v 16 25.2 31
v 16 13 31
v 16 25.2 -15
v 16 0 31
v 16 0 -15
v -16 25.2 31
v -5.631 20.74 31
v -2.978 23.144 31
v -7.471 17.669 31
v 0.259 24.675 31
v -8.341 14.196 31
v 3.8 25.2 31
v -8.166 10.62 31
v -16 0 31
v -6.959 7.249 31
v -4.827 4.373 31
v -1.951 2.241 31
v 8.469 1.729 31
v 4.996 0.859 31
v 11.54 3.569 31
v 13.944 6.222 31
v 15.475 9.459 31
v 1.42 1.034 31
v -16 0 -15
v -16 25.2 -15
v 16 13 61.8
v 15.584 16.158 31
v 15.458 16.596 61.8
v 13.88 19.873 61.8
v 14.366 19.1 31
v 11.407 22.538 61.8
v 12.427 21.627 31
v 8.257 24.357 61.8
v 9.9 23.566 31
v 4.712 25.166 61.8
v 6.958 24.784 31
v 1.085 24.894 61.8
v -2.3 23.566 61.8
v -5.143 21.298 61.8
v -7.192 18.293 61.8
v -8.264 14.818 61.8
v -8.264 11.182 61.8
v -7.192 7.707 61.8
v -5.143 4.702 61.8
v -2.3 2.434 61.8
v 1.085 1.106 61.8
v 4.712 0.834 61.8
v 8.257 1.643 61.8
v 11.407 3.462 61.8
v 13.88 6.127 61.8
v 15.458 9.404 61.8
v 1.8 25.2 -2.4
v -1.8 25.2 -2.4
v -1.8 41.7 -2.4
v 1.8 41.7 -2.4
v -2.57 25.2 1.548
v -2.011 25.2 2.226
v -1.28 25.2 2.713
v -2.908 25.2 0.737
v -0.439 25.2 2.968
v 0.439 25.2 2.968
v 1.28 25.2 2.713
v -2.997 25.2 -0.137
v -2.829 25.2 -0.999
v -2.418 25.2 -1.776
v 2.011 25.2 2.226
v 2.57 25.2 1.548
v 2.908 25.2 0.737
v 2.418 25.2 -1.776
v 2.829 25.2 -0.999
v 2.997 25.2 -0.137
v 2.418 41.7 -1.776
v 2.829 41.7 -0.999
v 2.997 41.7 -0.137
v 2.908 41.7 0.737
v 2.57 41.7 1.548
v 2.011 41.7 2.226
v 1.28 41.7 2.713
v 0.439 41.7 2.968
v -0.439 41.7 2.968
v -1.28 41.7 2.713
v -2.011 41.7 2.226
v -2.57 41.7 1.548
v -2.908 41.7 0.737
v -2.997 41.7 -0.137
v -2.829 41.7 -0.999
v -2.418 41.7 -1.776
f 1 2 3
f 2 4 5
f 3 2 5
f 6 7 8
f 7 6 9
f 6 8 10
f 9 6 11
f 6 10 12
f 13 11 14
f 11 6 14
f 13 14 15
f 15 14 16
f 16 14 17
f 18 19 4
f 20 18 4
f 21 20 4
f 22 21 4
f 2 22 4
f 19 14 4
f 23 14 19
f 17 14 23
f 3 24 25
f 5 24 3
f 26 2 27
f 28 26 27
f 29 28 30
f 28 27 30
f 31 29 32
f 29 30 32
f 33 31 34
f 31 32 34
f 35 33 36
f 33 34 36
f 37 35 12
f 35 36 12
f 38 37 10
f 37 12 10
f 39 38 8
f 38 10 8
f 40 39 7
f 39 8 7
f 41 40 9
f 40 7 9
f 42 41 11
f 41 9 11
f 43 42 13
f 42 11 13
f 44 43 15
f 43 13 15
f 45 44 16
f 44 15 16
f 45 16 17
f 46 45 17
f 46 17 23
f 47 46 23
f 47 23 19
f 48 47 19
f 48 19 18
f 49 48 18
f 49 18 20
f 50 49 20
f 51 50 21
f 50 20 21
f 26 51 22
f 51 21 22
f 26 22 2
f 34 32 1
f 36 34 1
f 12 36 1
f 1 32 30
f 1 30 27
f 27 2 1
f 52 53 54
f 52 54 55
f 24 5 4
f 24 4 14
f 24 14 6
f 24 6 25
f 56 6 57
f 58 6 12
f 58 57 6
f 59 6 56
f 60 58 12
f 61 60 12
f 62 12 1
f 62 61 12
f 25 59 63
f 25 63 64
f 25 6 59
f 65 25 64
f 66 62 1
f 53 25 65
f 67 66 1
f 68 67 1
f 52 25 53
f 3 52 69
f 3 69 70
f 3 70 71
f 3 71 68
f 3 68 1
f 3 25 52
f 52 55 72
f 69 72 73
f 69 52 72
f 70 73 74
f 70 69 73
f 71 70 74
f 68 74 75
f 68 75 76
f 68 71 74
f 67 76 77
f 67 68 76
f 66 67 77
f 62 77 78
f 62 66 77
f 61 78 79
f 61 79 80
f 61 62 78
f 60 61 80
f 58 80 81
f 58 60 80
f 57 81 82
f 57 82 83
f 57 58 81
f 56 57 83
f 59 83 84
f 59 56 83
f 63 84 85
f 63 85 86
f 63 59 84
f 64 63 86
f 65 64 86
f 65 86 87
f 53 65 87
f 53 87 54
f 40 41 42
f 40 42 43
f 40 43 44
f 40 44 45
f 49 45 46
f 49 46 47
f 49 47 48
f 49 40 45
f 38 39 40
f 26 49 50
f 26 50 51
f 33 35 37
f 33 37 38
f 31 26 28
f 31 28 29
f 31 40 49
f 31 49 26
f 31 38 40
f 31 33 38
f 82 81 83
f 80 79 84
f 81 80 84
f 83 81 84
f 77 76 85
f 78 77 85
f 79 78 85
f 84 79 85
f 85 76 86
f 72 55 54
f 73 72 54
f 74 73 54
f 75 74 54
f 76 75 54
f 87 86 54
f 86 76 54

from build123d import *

# Parameters (mm, degrees)
SKETCH1_W           = 32
SKETCH1_H           = 46
BOSS_EXTRUDE1_DEPTH = 25.2
BOSS_EXTRUDE2_START = 25.2
BOSS_EXTRUDE2_DEPTH = 16.5
SKETCH2_R           = 12.2
BOSS_EXTRUDE3_DEPTH = 30.8


with BuildPart() as part:
    # Sketch1 → Boss-Extrude1 (new body)
    # profile 1 of 2: a face of its own
    with BuildSketch(Plane(origin=(0, 0, 0), x_dir=(1, 0, 0), z_dir=(0, 1, 0))):
        with Locations((0, -8)):
            Rectangle(SKETCH1_W, SKETCH1_H)
        with BuildLine():
            ThreePointArc((-1.8, 2.4), (0, -3), (1.8, 2.4))
            Line((1.8, 2.4), (-1.8, 2.4))
        make_face(mode=Mode.SUBTRACT)
    # profile 2 of 2: a face of its own
    with BuildSketch(Plane(origin=(0, 0, 0), x_dir=(1, 0, 0), z_dir=(0, 1, 0))):
        with BuildLine():
            Line((-1.8, 2.4), (1.8, 2.4))
            ThreePointArc((1.8, 2.4), (0, -3), (-1.8, 2.4))
        make_face()
    extrude(amount=BOSS_EXTRUDE1_DEPTH)

    # Sketch1<3> → Boss-Extrude2 (add)
    with BuildSketch(Plane(origin=(0, 0, 0), x_dir=(1, 0, 0), z_dir=(0, 1, 0)).offset(BOSS_EXTRUDE2_START)):
        with BuildLine():
            Line((-1.8, 2.4), (1.8, 2.4))
            ThreePointArc((1.8, 2.4), (0, -3), (-1.8, 2.4))
        make_face()
    extrude(amount=BOSS_EXTRUDE2_DEPTH)

    # Sketch2 → Boss-Extrude3 (add)
    with BuildSketch(Plane.XY.offset(31)):
        with Locations((3.8, 13)):
            Circle(SKETCH2_R)
    extrude(amount=BOSS_EXTRUDE3_DEPTH)


solid = part.part
